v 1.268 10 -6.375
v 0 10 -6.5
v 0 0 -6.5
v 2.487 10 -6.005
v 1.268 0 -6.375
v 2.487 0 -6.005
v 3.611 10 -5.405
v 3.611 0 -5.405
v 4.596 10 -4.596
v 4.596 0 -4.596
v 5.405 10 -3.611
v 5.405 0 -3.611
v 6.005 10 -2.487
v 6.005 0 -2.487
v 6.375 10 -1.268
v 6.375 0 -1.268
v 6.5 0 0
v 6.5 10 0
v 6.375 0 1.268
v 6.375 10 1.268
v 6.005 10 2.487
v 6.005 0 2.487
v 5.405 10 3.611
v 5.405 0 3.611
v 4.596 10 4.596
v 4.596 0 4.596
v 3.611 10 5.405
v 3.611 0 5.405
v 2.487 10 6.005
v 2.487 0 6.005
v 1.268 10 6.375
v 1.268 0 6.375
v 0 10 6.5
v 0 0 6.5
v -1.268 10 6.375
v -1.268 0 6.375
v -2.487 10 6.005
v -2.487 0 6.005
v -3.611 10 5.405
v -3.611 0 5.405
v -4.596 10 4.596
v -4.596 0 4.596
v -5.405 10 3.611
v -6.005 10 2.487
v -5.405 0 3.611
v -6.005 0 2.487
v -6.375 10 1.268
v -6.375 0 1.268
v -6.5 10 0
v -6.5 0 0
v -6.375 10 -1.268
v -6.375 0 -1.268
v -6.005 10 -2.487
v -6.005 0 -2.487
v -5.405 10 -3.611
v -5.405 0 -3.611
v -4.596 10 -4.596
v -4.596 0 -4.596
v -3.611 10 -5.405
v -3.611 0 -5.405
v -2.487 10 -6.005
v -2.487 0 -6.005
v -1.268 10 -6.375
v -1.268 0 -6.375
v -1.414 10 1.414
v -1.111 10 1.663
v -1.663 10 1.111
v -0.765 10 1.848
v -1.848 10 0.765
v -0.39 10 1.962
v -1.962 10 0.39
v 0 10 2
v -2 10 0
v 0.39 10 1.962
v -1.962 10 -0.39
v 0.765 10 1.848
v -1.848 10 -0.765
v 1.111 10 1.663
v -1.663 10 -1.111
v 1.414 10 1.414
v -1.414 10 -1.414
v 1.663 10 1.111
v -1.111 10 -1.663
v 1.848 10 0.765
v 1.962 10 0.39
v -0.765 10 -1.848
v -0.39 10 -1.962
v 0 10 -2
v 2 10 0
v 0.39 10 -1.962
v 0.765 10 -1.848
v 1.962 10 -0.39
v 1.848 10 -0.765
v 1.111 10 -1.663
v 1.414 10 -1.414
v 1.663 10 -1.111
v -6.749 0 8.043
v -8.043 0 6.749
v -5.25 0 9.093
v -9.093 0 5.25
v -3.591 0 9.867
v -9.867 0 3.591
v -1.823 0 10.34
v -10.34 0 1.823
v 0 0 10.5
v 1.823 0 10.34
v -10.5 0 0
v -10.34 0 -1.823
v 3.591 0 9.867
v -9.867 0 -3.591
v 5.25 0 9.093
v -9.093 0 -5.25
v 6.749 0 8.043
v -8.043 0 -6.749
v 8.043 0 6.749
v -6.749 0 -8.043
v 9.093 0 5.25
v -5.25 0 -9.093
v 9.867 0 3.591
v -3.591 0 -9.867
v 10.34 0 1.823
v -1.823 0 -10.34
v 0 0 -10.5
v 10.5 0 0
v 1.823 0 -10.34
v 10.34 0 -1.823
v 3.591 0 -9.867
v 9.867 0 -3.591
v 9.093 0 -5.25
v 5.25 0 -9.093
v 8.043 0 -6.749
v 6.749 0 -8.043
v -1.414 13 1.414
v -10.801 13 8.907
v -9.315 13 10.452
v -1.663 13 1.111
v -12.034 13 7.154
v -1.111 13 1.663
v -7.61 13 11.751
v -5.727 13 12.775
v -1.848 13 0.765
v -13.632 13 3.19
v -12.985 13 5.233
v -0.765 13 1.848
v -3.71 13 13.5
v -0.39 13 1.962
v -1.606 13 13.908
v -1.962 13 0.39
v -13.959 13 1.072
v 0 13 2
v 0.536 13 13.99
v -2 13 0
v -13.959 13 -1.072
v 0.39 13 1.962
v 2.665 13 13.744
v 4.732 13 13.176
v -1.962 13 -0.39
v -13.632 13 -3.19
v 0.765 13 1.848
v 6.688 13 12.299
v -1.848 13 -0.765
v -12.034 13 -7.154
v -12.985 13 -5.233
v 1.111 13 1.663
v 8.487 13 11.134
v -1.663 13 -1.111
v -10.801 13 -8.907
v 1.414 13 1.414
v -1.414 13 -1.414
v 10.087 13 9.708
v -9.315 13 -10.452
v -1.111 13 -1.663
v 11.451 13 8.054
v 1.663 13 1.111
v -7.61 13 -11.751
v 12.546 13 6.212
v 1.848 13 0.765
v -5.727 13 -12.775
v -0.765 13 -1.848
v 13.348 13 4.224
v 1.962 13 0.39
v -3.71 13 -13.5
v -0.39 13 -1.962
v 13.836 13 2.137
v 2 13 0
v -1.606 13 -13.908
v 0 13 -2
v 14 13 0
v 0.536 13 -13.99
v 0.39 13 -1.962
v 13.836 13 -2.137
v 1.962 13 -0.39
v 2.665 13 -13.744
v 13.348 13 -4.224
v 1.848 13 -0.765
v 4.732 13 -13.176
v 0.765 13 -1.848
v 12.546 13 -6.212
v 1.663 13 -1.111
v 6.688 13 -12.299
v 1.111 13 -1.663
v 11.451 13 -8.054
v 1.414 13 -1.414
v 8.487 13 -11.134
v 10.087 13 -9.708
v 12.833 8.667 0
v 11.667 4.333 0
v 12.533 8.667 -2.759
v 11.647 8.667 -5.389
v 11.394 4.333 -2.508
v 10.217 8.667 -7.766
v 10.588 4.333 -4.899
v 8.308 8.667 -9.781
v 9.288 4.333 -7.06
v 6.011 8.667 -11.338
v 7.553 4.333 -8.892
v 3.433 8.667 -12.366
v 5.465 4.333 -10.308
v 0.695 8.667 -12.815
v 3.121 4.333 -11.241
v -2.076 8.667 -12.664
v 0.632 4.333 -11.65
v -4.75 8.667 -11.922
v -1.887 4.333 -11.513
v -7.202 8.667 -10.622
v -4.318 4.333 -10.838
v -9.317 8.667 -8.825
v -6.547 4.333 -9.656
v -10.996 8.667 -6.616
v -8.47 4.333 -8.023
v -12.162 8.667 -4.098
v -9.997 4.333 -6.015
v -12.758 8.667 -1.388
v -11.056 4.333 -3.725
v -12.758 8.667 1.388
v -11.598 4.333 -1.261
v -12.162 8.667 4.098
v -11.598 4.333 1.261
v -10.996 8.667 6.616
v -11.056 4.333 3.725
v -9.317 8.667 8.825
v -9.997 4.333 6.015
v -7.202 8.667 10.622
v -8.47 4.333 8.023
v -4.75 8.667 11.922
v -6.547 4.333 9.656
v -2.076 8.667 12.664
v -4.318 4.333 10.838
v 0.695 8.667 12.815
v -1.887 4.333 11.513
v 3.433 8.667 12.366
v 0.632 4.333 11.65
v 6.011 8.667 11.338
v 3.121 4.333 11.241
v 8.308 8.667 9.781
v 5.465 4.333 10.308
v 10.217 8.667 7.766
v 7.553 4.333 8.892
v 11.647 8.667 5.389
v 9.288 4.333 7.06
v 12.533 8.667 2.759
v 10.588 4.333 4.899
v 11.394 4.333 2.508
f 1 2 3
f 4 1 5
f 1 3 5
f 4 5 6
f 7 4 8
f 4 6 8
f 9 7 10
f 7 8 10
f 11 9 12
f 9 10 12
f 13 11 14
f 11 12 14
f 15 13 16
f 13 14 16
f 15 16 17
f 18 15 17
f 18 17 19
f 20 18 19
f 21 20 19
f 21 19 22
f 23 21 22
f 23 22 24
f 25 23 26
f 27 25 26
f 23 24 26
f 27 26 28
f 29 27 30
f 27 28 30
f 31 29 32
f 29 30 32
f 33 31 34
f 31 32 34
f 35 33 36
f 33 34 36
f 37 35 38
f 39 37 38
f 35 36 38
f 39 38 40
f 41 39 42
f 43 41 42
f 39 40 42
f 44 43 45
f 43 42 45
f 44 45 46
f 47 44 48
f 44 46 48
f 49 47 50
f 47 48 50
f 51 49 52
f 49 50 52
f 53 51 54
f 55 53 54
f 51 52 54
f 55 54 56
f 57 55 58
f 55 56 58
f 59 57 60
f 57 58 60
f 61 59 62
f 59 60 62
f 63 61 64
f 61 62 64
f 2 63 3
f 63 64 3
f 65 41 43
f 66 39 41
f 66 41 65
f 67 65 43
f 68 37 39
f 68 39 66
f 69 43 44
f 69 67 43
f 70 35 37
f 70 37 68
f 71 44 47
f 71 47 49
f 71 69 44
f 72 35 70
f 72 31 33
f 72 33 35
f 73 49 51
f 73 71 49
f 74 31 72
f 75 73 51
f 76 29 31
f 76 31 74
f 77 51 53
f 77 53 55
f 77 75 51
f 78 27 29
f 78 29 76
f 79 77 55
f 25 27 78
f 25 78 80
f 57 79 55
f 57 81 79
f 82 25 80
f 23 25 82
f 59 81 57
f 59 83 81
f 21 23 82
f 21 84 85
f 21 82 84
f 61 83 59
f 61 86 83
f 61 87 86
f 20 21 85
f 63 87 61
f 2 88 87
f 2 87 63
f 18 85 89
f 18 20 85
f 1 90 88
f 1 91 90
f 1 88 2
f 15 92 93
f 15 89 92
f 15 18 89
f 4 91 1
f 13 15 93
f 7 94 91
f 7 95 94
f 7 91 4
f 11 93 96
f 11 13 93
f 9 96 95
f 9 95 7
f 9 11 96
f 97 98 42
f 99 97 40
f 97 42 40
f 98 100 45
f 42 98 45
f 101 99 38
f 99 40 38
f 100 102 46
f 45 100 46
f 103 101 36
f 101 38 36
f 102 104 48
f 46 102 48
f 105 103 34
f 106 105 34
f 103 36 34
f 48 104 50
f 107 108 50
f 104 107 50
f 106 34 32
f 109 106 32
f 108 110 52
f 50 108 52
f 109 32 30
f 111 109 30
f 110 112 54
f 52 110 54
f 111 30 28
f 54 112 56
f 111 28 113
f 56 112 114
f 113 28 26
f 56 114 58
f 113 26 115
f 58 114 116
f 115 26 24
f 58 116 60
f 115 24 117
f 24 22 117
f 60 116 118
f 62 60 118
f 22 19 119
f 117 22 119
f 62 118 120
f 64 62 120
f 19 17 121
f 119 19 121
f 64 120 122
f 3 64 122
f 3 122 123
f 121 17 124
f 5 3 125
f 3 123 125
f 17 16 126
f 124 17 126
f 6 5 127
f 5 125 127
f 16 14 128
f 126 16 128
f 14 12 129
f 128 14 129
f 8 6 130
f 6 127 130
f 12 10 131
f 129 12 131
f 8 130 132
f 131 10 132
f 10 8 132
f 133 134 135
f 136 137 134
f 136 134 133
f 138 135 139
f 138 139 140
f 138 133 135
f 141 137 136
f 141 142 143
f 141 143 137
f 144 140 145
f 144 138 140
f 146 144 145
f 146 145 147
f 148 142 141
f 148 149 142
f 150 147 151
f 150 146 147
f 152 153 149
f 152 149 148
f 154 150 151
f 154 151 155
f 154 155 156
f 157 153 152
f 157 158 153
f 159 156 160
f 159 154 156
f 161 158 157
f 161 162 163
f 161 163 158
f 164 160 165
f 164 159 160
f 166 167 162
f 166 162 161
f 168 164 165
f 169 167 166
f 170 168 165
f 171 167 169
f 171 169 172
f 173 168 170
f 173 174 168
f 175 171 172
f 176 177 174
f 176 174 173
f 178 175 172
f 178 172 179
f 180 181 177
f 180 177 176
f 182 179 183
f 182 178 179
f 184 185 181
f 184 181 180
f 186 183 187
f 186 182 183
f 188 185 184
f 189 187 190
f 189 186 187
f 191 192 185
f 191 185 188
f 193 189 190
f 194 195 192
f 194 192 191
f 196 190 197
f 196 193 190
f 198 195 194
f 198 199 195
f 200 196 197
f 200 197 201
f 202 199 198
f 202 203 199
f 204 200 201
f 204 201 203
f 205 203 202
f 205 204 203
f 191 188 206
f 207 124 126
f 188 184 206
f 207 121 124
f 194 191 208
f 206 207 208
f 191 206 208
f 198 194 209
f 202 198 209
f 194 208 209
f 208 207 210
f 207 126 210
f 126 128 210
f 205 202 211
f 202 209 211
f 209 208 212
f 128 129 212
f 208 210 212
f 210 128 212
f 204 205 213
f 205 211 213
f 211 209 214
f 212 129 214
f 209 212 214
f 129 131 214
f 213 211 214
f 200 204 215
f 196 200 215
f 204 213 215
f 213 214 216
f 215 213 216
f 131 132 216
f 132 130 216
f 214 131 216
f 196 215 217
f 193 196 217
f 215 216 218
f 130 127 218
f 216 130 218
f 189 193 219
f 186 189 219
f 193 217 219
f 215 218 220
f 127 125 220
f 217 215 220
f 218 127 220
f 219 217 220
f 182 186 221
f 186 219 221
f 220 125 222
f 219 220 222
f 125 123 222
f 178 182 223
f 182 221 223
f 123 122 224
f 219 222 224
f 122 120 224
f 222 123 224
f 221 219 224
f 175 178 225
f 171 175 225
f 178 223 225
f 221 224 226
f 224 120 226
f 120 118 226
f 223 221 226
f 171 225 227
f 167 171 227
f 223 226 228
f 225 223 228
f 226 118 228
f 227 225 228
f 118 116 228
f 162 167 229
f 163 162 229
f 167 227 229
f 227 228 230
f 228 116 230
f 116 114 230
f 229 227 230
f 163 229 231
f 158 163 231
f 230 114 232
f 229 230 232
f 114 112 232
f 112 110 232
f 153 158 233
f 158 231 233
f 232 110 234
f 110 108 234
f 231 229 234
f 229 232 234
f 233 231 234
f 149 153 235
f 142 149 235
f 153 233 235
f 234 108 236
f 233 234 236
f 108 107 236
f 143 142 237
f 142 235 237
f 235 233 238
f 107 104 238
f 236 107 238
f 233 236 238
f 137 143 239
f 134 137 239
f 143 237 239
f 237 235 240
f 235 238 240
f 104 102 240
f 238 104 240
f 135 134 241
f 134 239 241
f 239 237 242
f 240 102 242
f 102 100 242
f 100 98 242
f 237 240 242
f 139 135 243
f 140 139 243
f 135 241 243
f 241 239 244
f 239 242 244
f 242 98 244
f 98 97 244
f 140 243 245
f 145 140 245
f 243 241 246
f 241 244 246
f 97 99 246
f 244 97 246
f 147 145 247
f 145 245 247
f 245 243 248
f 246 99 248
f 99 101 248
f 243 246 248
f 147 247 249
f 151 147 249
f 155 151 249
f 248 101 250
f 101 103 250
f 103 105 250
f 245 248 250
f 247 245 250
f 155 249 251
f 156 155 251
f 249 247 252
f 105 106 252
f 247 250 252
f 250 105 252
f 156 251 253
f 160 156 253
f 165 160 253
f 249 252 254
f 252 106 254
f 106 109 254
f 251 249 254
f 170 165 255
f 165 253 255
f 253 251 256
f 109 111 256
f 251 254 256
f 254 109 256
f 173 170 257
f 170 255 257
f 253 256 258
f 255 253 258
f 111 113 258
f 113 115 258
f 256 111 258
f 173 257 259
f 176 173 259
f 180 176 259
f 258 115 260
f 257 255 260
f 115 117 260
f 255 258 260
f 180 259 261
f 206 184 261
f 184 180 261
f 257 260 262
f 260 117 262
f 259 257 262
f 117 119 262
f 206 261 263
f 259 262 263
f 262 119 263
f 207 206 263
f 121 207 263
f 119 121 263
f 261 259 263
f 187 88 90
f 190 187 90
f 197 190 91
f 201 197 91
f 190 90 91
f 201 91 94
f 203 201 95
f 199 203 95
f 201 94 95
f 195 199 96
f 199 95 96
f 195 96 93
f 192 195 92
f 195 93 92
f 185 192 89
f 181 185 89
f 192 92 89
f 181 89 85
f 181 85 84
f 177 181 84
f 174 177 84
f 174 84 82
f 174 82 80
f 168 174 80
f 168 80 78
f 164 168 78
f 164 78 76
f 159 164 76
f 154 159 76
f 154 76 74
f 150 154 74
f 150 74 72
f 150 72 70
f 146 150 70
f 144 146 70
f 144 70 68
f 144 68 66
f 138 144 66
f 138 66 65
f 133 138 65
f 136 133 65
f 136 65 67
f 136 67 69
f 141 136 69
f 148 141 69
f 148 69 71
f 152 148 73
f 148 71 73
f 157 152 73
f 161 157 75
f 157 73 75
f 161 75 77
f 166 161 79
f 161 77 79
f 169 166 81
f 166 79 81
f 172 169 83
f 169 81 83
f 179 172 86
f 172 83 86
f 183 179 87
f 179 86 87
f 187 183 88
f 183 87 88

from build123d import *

# Parameters (mm, degrees)
SKETCH_2_R          = 14
SKETCH_1_R          = 10.5
SKETCH_3_R          = 6.5
CUT_EXTRUDE_1_DEPTH = 10
SKETCH_4_R          = 2
CUT_EXTRUDE_2_DEPTH = 23.181073184


with BuildPart() as part:
    # Эскиз2 → По сечениям1 section 0
    with BuildSketch(Plane(origin=(0, 13, 0), x_dir=(1, 0, 0), z_dir=(0, 1, 0))):
        Circle(SKETCH_2_R)
    # Эскиз1 → По сечениям1 section 1
    with BuildSketch(Plane(origin=(0, 0, 0), x_dir=(1, 0, 0), z_dir=(0, 1, 0))):
        Circle(SKETCH_1_R)
    loft()

    # Эскиз3 → Вырез-Вытянуть1 (cut)
    with BuildSketch(Plane.XZ):
        with Locations(Location((0, 0, 0), (0, 0, 270))):
            Circle(SKETCH_3_R)
    extrude(amount=-CUT_EXTRUDE_1_DEPTH, mode=Mode.SUBTRACT)

    # Эскиз4 → Вырез-Вытянуть2 (cut, through all)
    with BuildSketch(Plane.XZ.offset(-10)):
        with Locations(Location((0, 0, 0), (0, 0, 270))):
            Circle(SKETCH_4_R)
    extrude(amount=-CUT_EXTRUDE_2_DEPTH, mode=Mode.SUBTRACT)


solid = part.part
